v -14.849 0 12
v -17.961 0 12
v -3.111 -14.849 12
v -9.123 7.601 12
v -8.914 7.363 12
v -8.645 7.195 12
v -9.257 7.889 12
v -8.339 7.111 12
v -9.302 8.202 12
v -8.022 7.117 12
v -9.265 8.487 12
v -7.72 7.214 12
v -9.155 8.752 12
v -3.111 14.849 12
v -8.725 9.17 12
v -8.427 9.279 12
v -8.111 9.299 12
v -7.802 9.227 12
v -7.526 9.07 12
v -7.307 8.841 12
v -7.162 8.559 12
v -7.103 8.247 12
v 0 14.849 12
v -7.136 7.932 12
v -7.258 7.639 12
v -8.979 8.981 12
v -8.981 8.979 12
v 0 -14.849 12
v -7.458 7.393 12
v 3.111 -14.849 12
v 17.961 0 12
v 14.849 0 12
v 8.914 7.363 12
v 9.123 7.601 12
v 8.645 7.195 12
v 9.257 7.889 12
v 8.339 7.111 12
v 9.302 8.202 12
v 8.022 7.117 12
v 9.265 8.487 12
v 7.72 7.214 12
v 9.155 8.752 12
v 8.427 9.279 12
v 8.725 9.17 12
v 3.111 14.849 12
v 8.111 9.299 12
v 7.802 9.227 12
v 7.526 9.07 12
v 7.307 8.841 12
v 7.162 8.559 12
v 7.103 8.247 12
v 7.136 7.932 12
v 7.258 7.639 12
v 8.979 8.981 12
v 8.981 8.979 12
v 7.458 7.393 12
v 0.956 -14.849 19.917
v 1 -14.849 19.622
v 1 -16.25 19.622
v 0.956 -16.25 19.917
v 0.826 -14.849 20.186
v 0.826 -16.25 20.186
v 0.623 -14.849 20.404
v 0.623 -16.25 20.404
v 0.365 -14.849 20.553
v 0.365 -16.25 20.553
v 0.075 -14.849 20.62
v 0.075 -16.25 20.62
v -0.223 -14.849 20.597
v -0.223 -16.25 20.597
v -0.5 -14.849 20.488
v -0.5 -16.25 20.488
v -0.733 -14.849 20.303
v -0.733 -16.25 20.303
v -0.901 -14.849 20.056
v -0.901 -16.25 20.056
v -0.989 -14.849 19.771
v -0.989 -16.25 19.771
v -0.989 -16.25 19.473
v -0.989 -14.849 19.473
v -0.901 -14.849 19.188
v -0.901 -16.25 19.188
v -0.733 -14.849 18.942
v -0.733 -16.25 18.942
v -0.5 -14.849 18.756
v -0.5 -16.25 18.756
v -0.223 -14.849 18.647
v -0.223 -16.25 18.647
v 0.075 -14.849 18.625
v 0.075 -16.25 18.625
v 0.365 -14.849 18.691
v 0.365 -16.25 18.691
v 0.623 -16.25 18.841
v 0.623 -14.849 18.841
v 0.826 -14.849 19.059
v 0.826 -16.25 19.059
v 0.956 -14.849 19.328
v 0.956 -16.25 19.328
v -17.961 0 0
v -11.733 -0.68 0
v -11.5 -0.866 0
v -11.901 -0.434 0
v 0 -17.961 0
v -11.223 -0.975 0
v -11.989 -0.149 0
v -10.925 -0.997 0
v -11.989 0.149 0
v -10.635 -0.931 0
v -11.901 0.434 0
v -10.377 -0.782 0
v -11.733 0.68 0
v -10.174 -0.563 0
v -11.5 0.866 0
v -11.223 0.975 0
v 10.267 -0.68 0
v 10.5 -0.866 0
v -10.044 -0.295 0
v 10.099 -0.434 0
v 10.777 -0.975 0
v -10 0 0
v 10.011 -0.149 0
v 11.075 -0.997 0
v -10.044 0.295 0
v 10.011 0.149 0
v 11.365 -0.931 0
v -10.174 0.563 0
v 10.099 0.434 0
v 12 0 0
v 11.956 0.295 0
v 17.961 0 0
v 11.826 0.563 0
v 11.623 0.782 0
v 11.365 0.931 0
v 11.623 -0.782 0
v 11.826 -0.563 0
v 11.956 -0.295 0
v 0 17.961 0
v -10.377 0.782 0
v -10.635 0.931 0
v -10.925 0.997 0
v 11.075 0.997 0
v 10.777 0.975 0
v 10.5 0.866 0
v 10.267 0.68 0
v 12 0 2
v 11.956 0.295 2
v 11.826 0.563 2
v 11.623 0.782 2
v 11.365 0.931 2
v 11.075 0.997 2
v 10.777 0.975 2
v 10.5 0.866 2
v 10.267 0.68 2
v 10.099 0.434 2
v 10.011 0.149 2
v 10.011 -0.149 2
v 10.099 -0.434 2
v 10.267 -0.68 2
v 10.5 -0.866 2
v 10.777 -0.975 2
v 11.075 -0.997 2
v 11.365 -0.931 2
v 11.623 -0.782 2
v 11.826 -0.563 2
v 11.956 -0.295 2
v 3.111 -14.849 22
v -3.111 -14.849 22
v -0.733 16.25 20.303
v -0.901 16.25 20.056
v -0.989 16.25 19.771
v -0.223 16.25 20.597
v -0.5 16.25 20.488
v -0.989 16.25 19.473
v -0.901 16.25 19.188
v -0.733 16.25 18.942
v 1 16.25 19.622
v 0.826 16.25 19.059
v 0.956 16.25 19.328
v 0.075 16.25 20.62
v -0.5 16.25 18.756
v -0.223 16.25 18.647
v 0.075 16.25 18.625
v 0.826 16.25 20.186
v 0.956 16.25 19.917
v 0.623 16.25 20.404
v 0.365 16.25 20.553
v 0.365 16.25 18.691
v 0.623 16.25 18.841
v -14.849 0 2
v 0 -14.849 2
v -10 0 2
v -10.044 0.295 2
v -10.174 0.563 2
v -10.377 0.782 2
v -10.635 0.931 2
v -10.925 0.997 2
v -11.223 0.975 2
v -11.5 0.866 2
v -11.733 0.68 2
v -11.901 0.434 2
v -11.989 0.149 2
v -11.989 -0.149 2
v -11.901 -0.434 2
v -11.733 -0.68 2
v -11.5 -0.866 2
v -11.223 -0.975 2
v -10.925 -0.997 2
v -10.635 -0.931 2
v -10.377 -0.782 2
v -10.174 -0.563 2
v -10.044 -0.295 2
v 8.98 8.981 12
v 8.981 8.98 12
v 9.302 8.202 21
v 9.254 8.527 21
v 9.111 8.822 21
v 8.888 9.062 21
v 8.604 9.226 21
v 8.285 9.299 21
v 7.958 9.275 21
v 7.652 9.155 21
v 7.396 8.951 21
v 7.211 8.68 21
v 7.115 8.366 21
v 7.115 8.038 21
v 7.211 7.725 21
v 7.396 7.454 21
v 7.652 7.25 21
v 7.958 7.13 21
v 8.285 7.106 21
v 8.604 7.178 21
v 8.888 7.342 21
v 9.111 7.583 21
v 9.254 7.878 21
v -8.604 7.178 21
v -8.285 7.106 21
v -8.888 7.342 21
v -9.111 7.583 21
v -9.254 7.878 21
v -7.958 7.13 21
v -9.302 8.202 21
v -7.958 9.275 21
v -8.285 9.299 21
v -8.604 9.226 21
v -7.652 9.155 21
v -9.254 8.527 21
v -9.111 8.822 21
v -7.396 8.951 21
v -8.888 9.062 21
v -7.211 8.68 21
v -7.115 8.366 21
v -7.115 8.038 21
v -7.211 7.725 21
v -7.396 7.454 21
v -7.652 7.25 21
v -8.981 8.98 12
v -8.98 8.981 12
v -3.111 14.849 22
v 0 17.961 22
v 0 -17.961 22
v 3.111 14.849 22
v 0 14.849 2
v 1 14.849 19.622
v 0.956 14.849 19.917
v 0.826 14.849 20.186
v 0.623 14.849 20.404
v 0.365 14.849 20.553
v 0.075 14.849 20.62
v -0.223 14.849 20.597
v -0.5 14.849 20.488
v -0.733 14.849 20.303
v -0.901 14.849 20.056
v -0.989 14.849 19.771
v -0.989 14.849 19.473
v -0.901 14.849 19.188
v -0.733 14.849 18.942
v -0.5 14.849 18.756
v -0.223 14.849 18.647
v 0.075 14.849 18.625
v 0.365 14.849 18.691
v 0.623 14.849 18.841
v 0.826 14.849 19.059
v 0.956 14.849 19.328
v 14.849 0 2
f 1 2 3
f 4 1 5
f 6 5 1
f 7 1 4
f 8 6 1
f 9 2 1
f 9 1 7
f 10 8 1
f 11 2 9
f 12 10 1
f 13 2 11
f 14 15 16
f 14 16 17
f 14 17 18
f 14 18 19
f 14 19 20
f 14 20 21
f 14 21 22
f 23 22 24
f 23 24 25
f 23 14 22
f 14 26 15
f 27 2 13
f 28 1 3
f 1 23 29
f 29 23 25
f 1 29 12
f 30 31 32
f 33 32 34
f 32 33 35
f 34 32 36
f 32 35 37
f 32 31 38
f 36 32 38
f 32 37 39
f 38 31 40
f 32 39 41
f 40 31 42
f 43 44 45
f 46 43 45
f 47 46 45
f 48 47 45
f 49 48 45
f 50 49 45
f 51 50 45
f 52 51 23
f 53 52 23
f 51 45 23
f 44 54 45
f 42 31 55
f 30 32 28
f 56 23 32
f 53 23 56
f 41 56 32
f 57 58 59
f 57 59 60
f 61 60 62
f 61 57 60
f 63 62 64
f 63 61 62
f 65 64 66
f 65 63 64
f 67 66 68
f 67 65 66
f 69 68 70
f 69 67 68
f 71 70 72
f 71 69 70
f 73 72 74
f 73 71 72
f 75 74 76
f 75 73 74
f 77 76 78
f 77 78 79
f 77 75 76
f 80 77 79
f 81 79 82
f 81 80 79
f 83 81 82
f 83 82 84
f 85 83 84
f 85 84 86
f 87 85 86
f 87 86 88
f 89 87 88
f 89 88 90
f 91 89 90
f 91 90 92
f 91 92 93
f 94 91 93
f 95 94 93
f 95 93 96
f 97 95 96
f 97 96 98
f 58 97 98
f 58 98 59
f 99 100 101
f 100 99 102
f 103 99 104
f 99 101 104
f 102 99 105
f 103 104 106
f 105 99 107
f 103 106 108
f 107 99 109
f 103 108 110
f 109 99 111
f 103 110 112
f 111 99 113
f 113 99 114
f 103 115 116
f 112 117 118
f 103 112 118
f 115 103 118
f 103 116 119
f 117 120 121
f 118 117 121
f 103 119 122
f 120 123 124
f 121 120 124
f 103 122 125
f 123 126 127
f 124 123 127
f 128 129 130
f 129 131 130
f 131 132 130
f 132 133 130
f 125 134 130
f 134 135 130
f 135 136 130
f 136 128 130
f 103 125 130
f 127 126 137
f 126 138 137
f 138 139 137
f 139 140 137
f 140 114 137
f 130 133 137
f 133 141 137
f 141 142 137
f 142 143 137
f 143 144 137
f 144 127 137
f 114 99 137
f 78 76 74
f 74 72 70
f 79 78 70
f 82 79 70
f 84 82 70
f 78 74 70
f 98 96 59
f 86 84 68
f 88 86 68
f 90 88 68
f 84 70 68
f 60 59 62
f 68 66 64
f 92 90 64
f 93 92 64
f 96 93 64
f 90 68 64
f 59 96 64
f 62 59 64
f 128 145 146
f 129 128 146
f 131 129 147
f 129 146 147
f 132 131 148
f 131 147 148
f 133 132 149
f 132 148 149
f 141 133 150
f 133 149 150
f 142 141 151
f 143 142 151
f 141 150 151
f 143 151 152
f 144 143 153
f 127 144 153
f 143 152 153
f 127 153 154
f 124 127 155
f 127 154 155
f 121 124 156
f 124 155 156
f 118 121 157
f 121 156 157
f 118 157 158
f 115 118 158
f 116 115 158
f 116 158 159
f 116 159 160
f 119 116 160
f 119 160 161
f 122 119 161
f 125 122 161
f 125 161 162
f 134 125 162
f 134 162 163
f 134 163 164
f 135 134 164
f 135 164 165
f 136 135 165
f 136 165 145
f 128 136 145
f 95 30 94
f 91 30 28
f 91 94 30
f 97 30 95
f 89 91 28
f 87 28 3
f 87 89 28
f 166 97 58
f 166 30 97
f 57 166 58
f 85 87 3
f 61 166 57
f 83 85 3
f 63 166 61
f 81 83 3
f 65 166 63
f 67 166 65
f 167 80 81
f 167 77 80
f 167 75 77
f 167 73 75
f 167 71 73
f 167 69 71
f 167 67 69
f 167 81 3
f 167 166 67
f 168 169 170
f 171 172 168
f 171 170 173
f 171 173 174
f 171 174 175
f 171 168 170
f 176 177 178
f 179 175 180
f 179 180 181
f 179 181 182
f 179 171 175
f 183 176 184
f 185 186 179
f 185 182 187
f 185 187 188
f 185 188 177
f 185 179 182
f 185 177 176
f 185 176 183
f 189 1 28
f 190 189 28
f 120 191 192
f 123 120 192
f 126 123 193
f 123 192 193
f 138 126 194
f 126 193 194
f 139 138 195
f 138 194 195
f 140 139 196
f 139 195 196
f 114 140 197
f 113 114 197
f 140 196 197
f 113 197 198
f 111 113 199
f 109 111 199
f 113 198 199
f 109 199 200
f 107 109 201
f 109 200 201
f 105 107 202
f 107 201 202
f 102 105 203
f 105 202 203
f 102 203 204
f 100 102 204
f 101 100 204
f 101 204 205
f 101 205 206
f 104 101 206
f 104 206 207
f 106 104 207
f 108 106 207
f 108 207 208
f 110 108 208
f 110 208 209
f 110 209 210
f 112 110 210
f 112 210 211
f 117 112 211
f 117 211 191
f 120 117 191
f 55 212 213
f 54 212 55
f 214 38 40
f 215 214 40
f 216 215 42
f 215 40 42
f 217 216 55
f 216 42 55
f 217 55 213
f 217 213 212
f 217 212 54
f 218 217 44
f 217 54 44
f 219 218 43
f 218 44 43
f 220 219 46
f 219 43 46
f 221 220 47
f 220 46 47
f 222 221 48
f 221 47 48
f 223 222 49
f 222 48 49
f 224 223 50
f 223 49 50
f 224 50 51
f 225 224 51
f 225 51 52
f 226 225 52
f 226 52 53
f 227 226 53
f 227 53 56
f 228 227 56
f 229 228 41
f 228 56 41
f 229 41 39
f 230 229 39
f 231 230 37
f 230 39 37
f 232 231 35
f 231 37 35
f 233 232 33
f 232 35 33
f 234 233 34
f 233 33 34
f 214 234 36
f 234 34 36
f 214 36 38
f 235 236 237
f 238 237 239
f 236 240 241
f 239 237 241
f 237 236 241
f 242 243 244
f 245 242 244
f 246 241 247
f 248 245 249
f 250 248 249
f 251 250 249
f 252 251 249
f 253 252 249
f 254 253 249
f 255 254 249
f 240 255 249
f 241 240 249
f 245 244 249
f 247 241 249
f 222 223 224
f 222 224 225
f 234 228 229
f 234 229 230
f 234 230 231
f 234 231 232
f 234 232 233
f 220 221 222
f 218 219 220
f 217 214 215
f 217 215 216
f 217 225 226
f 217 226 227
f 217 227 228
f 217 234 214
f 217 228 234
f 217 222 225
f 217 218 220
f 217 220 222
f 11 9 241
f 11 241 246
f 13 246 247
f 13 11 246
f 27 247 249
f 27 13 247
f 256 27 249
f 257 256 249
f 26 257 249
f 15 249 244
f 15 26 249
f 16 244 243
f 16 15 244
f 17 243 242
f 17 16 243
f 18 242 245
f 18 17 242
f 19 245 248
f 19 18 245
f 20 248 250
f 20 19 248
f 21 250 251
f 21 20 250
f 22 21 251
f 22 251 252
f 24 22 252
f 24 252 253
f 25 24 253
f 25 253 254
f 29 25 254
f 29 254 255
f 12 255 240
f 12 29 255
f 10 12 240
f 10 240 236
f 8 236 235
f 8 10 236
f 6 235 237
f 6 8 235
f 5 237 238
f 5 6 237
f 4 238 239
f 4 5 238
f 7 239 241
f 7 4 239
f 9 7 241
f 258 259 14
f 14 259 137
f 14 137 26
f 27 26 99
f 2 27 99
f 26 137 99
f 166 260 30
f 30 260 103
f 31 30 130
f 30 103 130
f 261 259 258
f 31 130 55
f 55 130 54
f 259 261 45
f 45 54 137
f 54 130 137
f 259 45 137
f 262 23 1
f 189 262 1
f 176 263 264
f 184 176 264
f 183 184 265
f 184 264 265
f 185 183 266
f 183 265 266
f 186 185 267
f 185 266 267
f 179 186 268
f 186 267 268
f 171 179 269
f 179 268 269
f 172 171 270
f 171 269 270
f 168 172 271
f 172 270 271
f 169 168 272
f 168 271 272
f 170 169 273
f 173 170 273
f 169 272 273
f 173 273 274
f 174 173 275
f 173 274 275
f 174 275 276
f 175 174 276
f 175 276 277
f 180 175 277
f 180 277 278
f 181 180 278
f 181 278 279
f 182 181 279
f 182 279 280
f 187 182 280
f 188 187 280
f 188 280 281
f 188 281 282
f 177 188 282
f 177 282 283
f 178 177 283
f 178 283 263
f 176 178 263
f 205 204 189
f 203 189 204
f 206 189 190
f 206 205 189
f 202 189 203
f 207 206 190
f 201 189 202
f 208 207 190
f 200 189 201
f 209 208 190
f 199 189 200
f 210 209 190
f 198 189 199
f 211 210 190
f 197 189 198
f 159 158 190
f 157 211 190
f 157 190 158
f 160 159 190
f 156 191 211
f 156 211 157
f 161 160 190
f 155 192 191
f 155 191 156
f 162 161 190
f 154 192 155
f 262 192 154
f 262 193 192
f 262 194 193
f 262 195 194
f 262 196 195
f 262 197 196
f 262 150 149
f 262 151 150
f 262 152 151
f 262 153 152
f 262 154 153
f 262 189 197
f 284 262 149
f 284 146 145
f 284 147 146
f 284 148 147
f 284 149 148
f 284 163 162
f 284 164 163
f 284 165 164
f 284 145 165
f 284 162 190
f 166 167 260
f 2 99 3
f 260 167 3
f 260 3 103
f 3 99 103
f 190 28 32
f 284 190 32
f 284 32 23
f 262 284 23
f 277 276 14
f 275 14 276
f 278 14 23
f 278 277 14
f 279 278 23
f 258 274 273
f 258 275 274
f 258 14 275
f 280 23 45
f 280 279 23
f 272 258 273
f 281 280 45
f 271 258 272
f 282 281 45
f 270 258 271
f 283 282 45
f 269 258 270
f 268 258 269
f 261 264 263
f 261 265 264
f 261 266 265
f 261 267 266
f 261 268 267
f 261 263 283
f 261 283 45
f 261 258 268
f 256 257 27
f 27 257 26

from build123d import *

# Parameters (mm, degrees)
PAD_DEPTH            = 22
POCKET_DEPTH         = 20
POCKET001_DEPTH      = 10
SKETCH003_R          = 1
POCKET002_DEPTH      = 16.25
POCKET002_DEPTH_BACK = -16.25
SKETCH004_R          = 1.1
PAD001_DEPTH         = 9
SKETCH005_R          = 1
POCKET003_DEPTH      = 5


with BuildPart() as part:
    # Sketch → Pad (new body)
    with BuildSketch(Plane.XY):
        Polygon((0, -17.960512), (17.960512, 0), (0, 17.960512), (-17.960512, 0), align=None)
    extrude(amount=PAD_DEPTH)

    # Sketch001 (on Face6 of Pad) → Pocket (cut)
    with BuildSketch(Plane.XY.offset(22)):
        Polygon((0, 14.849242), (-14.849242, 0), (0, -14.849242), (14.849242, 0), align=None)
    extrude(amount=-POCKET_DEPTH, mode=Mode.SUBTRACT)

    # Sketch002 (on Face5 of Pocket) → Pocket001 (cut)
    with BuildSketch(Plane.XY.offset(22)):
        Polygon((-3.11127, 14.849242), (-17.960512, 0), (-3.11127, -14.849242), (0, -14.849242), (-14.849242, 0), (0, 14.849242), align=None)
    pocket001 = extrude(amount=-POCKET001_DEPTH, mode=Mode.SUBTRACT)

    # Mirrored: Pocket001 across YZ
    add(pocket001.mirror(Plane.YZ), mode=Mode.SUBTRACT)

    # Sketch003 → Pocket002 (cut, two sides)
    with BuildSketch(Plane.XZ) as pocket002_sk:
        with Locations((0, 19.622342)):
            Circle(SKETCH003_R)
    extrude(amount=-POCKET002_DEPTH, mode=Mode.SUBTRACT)
    extrude(pocket002_sk.sketch, amount=-POCKET002_DEPTH_BACK, mode=Mode.SUBTRACT)

    # Sketch004 (on Face15 of Pocket002) → Pad001 (join)
    with BuildSketch(Plane.XY.offset(12)):
        with Locations((8.202439, 8.202439)):
            Circle(SKETCH004_R)
    pad001 = extrude(amount=PAD001_DEPTH)

    # Mirrored001: Pad001 across YZ
    add(pad001.mirror(Plane.YZ))

    # Sketch005 (on Face21 of Mirrored001) → Pocket003 (cut)
    with BuildSketch(Plane.XY.offset(2)):
        with Locations((-11, 0)):
            Circle(SKETCH005_R)
        with Locations((11, 0)):
            Circle(SKETCH005_R)
    extrude(amount=-POCKET003_DEPTH, mode=Mode.SUBTRACT)


solid = part.part
